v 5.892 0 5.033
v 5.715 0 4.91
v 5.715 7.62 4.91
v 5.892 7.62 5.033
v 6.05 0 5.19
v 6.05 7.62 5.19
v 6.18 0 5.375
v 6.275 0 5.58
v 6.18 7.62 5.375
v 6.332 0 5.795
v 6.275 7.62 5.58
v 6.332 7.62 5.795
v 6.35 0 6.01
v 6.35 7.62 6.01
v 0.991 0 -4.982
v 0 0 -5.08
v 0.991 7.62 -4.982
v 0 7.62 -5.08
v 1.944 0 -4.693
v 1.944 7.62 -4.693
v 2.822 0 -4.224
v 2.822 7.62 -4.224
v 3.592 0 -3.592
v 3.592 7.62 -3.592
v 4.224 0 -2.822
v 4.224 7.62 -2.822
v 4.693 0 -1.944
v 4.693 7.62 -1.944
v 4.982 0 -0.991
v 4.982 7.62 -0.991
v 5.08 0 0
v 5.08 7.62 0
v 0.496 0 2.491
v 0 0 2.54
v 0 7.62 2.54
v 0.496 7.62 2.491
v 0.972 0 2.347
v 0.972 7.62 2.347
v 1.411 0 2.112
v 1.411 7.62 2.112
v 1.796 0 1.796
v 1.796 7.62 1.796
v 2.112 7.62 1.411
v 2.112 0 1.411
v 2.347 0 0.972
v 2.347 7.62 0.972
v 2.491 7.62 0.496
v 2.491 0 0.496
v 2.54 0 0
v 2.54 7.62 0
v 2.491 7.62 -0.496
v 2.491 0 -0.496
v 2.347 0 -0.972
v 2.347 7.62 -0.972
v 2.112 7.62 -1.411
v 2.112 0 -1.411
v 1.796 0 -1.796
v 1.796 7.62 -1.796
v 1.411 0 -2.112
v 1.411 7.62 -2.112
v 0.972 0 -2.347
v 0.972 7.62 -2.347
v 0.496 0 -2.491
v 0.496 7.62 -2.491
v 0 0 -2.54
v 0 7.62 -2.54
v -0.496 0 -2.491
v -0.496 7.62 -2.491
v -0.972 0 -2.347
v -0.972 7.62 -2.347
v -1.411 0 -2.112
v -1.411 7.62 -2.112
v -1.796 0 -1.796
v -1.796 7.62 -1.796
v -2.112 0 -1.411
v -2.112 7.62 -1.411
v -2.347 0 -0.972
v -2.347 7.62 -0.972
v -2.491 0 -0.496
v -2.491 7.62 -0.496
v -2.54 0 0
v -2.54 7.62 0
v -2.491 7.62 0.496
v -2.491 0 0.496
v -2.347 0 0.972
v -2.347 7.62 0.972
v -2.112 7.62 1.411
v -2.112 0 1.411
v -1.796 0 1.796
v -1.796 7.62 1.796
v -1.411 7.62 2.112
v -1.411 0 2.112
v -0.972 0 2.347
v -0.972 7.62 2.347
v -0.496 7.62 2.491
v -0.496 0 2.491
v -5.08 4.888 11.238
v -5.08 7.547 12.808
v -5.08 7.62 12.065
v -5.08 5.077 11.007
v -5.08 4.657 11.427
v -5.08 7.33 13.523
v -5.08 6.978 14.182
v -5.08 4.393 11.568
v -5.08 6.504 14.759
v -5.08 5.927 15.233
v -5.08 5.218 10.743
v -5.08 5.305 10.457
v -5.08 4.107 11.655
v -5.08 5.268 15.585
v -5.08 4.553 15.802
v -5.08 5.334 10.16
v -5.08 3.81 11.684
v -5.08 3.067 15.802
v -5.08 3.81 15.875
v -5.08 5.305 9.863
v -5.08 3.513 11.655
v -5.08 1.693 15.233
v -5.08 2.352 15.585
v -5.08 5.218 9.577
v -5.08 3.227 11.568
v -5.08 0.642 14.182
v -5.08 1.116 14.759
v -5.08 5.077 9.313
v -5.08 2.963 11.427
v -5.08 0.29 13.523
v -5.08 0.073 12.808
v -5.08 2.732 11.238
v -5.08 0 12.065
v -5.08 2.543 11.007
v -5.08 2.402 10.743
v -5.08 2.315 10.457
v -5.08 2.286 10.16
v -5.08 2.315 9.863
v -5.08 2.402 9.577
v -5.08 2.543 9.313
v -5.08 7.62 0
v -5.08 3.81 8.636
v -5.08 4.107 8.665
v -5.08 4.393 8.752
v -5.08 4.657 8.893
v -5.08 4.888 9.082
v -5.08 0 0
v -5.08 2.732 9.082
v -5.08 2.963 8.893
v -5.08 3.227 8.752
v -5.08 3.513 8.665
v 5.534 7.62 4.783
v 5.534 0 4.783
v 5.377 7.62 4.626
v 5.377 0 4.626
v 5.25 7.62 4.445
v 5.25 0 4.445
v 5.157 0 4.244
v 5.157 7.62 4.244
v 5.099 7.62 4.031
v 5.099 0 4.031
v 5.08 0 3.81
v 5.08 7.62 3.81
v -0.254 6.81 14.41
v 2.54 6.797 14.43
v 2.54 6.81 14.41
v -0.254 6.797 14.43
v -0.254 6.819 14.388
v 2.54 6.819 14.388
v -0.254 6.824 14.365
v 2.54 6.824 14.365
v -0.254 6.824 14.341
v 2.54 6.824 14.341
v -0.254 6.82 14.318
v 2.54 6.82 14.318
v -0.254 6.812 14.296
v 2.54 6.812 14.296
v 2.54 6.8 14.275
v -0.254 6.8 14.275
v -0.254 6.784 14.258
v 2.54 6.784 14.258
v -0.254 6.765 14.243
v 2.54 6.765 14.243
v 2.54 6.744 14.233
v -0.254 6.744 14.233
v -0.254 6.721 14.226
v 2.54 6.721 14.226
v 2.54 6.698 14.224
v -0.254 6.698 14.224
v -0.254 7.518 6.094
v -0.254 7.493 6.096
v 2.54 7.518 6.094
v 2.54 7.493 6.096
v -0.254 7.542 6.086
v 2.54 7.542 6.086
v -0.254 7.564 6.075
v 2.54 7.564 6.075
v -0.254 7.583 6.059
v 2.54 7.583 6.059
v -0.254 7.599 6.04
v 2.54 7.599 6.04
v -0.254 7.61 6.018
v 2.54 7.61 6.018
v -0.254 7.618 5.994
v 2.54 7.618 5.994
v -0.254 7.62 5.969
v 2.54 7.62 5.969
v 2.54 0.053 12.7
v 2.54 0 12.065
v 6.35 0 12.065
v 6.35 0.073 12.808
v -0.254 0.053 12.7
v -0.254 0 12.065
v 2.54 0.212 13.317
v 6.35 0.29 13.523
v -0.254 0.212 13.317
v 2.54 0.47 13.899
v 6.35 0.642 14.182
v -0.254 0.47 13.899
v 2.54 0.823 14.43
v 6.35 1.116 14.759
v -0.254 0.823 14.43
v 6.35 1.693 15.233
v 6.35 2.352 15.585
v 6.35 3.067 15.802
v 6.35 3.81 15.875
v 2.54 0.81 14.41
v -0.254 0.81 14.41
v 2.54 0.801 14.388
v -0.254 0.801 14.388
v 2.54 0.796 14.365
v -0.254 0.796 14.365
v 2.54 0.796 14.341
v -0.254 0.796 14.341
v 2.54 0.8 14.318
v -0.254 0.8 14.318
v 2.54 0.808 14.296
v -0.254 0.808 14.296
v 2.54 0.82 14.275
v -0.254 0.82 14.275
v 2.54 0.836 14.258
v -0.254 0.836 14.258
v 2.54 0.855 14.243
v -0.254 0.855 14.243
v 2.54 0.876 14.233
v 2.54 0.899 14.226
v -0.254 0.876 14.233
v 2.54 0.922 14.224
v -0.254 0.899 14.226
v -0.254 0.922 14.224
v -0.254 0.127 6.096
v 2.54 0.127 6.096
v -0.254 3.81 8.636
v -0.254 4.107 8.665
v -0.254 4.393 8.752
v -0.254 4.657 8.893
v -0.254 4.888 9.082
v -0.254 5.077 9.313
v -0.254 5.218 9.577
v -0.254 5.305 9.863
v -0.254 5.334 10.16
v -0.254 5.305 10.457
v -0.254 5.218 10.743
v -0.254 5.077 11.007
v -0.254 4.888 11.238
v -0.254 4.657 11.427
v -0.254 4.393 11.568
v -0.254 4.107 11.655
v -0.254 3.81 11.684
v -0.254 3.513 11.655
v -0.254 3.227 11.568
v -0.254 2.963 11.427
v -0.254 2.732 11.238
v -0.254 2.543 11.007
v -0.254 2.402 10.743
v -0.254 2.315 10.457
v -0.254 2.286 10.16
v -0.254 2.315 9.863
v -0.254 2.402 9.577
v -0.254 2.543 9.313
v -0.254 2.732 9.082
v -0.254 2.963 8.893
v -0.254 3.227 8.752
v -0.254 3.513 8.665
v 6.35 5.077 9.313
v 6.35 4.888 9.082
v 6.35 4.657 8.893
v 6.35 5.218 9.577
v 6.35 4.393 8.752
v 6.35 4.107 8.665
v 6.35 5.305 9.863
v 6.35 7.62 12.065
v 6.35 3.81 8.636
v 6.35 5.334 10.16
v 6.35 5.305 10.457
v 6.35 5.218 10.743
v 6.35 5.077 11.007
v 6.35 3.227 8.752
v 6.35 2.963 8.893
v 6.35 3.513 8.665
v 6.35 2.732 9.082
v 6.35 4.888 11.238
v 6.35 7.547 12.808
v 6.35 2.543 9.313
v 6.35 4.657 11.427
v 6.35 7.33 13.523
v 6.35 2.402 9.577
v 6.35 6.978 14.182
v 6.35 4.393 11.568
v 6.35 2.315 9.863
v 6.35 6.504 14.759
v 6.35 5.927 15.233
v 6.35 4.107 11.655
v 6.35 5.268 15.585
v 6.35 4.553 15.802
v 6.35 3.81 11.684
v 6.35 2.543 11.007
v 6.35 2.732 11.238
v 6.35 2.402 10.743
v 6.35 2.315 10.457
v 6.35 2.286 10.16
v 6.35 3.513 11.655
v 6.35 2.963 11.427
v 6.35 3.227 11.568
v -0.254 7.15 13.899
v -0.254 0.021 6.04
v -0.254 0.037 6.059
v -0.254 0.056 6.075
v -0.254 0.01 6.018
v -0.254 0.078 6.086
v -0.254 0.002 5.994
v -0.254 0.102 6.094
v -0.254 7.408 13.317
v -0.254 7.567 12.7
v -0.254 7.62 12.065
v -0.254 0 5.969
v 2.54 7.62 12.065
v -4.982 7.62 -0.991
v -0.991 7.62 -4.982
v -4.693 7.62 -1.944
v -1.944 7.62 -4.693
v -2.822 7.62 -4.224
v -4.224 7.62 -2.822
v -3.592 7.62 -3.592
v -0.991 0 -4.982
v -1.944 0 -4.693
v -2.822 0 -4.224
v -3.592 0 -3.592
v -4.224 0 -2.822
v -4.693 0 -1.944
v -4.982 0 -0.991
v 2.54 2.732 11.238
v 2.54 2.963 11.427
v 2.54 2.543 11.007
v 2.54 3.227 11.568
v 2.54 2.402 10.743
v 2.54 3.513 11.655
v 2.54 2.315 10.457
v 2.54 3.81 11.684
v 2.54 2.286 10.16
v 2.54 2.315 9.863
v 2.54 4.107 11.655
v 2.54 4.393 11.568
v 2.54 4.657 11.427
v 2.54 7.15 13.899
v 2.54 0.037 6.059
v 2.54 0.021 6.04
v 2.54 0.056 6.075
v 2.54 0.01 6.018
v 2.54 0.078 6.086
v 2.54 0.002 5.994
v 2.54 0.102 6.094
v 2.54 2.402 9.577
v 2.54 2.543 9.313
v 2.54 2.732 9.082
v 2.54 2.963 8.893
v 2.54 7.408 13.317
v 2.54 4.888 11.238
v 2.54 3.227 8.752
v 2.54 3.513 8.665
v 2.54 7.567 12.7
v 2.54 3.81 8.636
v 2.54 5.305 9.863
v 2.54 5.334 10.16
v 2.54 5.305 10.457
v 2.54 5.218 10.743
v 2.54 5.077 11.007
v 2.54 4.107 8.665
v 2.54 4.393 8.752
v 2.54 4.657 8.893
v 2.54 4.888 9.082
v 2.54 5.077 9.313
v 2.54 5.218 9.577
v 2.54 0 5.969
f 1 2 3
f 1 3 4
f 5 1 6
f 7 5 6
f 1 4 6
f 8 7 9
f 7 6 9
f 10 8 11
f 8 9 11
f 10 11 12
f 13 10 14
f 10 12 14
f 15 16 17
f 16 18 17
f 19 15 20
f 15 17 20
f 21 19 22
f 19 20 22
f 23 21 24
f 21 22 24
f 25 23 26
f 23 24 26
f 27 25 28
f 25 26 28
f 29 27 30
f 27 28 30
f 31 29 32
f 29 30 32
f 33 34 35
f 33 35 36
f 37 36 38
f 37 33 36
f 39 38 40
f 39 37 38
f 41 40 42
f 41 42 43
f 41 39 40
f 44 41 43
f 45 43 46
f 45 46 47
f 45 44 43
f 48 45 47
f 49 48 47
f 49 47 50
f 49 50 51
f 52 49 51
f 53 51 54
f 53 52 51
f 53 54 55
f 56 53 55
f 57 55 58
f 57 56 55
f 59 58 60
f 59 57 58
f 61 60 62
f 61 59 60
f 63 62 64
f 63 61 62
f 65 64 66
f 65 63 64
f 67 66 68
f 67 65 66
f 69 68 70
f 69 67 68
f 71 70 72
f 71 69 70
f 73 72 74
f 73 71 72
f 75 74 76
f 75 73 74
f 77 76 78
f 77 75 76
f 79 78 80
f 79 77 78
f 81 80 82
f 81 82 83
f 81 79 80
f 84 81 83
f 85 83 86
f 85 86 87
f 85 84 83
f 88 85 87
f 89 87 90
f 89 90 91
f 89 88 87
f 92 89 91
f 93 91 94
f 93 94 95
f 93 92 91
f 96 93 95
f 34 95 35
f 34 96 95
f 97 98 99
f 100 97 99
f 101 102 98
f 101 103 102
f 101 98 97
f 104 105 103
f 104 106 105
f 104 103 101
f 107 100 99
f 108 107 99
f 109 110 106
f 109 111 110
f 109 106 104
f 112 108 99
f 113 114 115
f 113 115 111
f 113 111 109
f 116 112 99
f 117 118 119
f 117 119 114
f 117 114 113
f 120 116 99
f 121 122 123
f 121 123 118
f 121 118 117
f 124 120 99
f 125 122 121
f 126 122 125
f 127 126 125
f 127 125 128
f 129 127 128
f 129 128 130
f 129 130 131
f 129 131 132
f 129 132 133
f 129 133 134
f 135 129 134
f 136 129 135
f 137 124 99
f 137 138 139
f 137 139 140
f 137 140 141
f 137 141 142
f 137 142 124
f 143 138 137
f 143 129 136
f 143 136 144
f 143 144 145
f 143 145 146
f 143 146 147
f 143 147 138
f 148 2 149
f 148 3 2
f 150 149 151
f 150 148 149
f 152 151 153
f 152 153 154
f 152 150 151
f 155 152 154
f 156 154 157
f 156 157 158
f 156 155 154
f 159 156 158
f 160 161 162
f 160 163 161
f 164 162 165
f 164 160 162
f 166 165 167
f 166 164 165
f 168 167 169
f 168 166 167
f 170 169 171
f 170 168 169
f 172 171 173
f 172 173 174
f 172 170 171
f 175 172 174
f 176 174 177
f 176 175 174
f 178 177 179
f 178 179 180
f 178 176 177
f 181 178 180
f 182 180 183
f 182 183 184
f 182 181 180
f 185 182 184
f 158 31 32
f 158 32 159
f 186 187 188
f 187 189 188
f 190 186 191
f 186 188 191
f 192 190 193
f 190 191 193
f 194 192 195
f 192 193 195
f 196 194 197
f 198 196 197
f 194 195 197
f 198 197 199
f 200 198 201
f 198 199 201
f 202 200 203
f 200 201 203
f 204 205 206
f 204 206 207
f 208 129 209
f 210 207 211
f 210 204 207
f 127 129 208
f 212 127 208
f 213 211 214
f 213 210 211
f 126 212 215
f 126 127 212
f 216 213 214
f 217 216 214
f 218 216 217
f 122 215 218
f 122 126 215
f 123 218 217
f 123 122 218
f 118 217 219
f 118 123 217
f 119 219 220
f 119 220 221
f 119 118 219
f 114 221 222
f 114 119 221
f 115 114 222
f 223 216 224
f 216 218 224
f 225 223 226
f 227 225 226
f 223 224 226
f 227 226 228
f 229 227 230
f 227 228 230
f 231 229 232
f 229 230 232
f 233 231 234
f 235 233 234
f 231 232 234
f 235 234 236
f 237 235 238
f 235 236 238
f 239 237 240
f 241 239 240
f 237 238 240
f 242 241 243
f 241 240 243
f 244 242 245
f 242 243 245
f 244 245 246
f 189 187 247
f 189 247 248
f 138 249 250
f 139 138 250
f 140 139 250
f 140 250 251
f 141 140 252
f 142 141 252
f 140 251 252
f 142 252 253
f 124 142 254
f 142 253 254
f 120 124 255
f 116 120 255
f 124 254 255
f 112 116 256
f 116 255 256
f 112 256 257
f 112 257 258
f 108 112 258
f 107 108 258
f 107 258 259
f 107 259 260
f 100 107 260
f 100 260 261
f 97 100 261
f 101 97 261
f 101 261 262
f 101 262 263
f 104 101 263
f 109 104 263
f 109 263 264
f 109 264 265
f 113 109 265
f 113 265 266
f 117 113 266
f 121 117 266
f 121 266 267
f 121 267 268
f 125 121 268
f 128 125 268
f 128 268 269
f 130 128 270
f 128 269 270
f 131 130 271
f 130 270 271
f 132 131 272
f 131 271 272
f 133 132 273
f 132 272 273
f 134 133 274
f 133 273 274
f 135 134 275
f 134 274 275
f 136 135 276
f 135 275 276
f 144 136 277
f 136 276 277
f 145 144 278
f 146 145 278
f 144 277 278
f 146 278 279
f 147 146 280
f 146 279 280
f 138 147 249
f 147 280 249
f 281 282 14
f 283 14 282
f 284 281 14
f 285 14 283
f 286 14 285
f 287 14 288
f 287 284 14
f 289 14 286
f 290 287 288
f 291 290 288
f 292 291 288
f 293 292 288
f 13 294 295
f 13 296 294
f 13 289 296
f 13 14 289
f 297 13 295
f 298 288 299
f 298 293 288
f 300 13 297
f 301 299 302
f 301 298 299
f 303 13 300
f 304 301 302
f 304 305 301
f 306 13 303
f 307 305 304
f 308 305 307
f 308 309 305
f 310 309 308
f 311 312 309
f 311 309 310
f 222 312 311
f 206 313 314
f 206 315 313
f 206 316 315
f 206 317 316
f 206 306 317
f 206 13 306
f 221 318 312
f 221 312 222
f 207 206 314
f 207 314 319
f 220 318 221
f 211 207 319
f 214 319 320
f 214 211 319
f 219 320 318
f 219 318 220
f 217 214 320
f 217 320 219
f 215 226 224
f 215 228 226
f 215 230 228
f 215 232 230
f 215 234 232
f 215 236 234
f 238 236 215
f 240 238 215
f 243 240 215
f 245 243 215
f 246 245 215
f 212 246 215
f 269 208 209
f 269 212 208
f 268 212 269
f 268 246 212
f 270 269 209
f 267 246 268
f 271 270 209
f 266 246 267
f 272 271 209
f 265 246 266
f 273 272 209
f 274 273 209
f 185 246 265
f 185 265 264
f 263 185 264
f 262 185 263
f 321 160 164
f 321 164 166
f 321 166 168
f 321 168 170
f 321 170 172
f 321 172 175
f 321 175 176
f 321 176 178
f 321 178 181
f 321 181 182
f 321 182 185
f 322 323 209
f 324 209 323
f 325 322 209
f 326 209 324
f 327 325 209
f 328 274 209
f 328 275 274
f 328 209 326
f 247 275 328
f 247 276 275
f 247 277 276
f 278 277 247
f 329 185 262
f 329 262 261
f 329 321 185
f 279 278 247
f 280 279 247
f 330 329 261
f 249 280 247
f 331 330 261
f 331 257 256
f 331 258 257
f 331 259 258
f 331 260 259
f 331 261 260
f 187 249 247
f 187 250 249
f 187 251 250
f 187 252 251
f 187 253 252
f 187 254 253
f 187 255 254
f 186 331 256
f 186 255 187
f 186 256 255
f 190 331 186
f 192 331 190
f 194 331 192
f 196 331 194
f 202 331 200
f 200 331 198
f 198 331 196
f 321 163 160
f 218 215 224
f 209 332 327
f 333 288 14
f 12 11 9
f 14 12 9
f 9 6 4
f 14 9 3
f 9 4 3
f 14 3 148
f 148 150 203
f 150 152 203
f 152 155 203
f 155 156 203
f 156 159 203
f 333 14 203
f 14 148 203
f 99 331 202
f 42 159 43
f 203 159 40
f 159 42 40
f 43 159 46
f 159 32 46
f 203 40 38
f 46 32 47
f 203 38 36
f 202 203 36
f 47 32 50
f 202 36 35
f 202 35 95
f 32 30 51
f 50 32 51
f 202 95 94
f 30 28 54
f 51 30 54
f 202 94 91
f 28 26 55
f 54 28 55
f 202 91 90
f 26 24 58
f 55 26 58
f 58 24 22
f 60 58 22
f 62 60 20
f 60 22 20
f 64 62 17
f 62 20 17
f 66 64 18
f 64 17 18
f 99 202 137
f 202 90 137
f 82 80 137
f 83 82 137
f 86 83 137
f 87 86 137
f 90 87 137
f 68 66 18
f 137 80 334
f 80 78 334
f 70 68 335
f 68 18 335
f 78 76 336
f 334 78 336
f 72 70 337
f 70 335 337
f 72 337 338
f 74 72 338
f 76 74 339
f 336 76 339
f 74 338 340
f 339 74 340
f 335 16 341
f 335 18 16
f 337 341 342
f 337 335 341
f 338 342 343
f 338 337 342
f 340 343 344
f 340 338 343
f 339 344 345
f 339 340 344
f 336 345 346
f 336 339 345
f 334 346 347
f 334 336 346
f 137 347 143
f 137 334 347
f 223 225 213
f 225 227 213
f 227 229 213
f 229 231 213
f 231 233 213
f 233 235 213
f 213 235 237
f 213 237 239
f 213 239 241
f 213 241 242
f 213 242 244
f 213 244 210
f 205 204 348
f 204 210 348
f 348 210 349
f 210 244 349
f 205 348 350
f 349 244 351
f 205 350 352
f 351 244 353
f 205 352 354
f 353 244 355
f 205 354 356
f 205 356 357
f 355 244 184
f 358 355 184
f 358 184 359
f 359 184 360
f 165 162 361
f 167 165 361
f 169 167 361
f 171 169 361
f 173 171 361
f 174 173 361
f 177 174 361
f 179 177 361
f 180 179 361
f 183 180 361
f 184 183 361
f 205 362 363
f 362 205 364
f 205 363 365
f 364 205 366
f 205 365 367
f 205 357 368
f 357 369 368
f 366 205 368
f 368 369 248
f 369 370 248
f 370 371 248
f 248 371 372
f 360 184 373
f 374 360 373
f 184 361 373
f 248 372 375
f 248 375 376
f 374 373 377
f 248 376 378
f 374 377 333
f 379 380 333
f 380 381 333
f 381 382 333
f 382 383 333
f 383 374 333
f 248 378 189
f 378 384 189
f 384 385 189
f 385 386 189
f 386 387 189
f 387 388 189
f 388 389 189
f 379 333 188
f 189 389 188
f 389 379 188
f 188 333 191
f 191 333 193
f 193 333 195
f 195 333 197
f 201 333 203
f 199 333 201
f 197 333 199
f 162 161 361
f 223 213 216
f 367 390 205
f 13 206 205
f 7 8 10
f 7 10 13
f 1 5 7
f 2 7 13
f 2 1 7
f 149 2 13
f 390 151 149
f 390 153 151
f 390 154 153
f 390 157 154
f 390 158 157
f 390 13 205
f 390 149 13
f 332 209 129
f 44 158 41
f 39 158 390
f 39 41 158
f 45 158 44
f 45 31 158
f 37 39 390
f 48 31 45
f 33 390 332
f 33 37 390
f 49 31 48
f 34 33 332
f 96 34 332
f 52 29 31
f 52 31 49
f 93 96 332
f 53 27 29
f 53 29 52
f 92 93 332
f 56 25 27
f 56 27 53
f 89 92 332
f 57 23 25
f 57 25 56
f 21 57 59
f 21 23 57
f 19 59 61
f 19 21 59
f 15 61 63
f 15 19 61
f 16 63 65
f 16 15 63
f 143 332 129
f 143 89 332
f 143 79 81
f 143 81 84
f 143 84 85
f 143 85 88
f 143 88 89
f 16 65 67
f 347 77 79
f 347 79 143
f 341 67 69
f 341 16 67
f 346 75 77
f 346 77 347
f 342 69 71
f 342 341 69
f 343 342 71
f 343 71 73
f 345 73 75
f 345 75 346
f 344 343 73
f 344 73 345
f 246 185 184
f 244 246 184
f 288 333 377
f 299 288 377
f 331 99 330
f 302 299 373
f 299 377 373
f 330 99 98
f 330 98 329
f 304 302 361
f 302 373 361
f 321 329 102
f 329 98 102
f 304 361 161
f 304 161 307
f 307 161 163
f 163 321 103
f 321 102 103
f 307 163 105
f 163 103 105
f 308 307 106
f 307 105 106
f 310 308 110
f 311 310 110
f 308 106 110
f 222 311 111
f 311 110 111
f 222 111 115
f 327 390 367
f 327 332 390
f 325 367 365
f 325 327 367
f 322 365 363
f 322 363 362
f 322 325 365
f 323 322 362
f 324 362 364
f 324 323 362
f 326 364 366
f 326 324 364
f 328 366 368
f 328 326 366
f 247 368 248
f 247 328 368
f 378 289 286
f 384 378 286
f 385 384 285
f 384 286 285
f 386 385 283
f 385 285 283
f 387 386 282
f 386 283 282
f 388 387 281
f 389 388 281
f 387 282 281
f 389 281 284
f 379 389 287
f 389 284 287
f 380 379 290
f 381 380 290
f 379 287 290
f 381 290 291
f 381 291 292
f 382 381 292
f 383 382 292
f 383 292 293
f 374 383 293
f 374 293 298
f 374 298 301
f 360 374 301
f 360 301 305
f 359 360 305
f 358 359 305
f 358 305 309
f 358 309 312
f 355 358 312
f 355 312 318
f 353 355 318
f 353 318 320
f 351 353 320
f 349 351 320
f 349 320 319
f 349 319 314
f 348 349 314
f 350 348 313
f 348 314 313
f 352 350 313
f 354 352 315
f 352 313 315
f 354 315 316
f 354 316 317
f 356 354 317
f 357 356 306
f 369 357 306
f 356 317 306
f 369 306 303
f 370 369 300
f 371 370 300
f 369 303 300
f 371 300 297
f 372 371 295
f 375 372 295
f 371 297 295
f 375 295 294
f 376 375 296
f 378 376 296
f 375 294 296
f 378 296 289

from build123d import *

# Parameters (mm, degrees)
SKETCH1_R           = 2.54
BOSS_EXTRUDE1_DEPTH = 7.62
SKETCH2_R           = 1.524
CUT_EXTRUDE1_DEPTH  = 21.993449574
FILLET1_R           = 5.08
FILLET4_R           = 3.81
FILLET2_R           = 1.27
FILLET3_R           = 1.27
SKETCH3_W           = 2.794
SKETCH3_H           = 8.128
CUT_EXTRUDE2_DEPTH  = 19.719041935
FILLET5_R           = 0.127


with BuildPart() as part:
    # Sketch1 → Boss-Extrude1 (new body)
    with BuildSketch(Plane(origin=(0, 0, 0), x_dir=(1, 0, 0), z_dir=(0, 1, 0))):
        Polygon((-5.08, 5.08), (5.08, 5.08), (5.08, -5.08), (6.35, -5.08), (6.35, -15.875), (-5.08, -15.875), align=None)
        with Locations(Location((0, 0, 0), (0, 0, 270))):
            Circle(SKETCH1_R, mode=Mode.SUBTRACT)
    extrude(amount=BOSS_EXTRUDE1_DEPTH)

    # Sketch2 → Cut-Extrude1 (cut, through all)
    with BuildSketch(Plane(origin=(6.35, 0, 0), x_dir=(0, 0, -1), z_dir=(1, 0, 0))):
        with Locations((-10.16, 3.81)):
            Circle(SKETCH2_R)
    extrude(amount=-CUT_EXTRUDE1_DEPTH, mode=Mode.SUBTRACT)

    # Fillet1
    fillet1_edges = [part.edges().sort_by_distance(p)[0] for p in [
        (-5.08, 3.81, -5.08),
        (5.08, 3.81, -5.08),
    ]]
    fillet(fillet1_edges, radius=FILLET1_R - 0.0001)  # a hair under: the kernel refuses the full size

    # Fillet4
    fillet4_edges = [part.edges().sort_by_distance(p)[0] for p in [
        (0.635, 0, 15.875),
        (0.635, 7.62, 15.875),
    ]]
    fillet(fillet4_edges, radius=FILLET4_R - 0.0001)  # a hair under: the kernel refuses the full size

    # Fillet2
    fillet2_edges = [part.edges().sort_by_distance(p)[0] for p in [
        (5.08, 3.81, 5.08),
    ]]
    fillet(fillet2_edges, radius=FILLET2_R - 0.0001)  # a hair under: the kernel refuses the full size

    # Fillet3
    fillet3_edges = [part.edges().sort_by_distance(p)[0] for p in [
        (6.35, 3.81, 5.08),
    ]]
    fillet(fillet3_edges, radius=FILLET3_R)

    # Sketch3 → Cut-Extrude2 (cut, through all)
    with BuildSketch(Plane(origin=(0, 7.62, 0), x_dir=(1, 0, 0), z_dir=(0, 1, 0))):
        with Locations((1.143, -10.16)):
            Rectangle(SKETCH3_W, SKETCH3_H)
    extrude(amount=-CUT_EXTRUDE2_DEPTH, mode=Mode.SUBTRACT)

    # Fillet5
    fillet5_edges = [part.edges().sort_by_distance(p)[0] for p in [
        (1.143, 0.670713991, 14.224),
        (1.143, 7.62, 6.096),
        (1.143, 6.949286009, 14.224),
        (1.143, 0, 6.096),
    ]]
    fillet(fillet5_edges, radius=FILLET5_R)


solid = part.part
